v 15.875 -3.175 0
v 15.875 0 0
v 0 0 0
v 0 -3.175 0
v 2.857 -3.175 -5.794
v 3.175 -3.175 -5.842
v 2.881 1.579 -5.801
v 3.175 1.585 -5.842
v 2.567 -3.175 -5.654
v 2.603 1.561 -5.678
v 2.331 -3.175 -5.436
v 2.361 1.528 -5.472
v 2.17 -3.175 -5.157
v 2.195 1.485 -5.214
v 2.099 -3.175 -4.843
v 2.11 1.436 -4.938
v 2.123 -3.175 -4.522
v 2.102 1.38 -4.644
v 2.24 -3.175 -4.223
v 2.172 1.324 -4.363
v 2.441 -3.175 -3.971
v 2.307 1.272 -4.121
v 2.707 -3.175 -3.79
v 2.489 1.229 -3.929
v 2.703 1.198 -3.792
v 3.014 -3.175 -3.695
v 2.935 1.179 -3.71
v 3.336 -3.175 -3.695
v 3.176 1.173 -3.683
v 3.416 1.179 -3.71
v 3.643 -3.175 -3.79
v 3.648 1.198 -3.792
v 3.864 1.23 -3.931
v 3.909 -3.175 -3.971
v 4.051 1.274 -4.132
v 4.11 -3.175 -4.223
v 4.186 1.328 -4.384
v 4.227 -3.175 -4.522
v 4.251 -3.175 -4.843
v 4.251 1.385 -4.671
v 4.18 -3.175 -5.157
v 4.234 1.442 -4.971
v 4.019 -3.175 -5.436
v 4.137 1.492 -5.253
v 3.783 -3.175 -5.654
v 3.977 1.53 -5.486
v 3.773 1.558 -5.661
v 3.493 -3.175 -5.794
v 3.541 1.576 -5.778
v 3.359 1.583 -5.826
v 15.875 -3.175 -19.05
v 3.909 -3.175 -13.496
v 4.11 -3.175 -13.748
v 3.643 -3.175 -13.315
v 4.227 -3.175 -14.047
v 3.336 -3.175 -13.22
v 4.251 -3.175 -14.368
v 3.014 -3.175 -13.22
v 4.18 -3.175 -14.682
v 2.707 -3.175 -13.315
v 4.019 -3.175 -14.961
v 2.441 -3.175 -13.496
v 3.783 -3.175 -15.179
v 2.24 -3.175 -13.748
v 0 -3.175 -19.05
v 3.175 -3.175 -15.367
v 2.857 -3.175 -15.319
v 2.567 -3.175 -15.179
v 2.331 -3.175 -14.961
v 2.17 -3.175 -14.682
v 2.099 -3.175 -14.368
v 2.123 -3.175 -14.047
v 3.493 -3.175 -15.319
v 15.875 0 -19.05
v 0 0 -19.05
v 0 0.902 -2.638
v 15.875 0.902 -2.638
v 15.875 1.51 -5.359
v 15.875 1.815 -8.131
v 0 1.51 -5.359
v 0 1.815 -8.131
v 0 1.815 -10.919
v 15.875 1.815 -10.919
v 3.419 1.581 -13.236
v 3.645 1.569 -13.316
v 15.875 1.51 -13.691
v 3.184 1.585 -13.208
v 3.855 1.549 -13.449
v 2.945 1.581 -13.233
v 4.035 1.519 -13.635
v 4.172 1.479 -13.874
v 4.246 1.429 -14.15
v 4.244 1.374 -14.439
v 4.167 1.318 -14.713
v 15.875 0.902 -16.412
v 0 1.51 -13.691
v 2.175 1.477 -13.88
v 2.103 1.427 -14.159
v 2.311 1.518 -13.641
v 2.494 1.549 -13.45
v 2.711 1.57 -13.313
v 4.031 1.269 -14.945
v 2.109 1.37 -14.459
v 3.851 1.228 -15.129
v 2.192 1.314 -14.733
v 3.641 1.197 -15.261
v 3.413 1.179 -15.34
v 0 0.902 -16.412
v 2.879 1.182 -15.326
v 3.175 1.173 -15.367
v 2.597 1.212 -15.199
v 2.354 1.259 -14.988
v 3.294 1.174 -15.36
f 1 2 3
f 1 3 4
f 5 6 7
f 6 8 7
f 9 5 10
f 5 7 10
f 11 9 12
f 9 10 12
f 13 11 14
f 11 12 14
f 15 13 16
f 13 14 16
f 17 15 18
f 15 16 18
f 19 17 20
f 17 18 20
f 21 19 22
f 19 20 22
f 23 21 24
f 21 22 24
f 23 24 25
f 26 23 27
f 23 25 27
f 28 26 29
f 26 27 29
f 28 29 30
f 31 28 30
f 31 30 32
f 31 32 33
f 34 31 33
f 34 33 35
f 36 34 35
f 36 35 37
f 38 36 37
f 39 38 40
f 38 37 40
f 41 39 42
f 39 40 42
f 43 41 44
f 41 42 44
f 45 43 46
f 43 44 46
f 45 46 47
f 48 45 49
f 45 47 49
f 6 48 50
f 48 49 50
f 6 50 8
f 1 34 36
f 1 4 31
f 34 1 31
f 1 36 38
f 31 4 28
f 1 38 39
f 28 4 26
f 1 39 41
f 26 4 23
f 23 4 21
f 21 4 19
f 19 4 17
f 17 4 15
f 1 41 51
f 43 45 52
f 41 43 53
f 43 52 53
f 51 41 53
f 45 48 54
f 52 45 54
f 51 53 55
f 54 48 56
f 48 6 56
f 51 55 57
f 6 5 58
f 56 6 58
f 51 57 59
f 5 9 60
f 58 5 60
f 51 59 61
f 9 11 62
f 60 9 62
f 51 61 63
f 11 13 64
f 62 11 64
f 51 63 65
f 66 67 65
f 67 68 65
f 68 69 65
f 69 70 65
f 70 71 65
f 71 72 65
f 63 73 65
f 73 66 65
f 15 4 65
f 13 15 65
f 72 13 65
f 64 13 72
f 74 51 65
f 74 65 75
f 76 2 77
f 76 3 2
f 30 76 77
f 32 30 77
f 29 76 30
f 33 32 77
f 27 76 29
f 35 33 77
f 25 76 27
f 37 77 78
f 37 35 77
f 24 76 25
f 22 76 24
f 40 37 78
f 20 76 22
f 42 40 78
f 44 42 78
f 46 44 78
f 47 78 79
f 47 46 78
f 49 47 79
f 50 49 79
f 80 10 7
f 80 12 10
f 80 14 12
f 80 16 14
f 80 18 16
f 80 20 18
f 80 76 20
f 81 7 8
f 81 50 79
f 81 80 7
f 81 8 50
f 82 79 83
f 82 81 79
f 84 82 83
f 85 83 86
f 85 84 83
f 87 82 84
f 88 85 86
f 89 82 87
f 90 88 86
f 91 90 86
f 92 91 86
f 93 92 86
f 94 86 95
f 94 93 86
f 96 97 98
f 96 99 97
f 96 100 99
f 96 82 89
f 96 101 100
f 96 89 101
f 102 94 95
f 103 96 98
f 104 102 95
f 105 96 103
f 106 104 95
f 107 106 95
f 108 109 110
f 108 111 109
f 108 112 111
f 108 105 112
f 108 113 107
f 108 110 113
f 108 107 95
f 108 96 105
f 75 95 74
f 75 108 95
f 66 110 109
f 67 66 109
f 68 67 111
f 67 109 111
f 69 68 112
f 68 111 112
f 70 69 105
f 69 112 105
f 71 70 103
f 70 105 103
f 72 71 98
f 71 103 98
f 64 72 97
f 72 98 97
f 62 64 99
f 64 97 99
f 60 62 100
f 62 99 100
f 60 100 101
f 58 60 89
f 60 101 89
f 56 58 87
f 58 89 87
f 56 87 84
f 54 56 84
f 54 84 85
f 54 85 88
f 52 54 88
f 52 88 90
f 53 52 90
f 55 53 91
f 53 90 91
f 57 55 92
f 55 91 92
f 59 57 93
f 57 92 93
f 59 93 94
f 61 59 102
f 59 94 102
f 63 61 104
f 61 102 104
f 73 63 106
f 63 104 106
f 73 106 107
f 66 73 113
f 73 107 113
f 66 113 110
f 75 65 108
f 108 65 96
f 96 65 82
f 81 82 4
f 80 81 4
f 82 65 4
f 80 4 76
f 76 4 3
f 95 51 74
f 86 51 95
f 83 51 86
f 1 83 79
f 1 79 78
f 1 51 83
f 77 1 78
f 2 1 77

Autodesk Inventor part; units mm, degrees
ref_plane "YZ Plane" through (0, 0, 0) normal (1, 0, 0) x (0, 1, 0)
ref_plane "XZ Plane" through (0, 0, 0) normal (0, 1, 0) x (-1, 0, 0)
ref_plane "XY Plane" through (0, 0, 0) normal (0, 0, 1) x (1, 0, 0)
sketch "Sketch1" plane through (0, 0, 0) normal (1, 0, 0) x (0, 1, 0)
  line L0 (0, 0) -> (-3.175, 0)
  line L1 (-3.175, 0) -> (-3.175, -19.05)
  line L2 (-3.175, -19.05) -> (0, -19.05)
  arc A0 (0, -19.05) -> (0, 0) centre (-23.5464, -9.525) ccw
  dimension "d4" = 3.175
  dimension "d6" = 25.4
  dimension "d7" = 19.05
  dimension "d23" = 3.175
extrude "Extrusion1" add sketch "Sketch1" along normal blind 15.875
sketch "Sketch2" plane through (0, -3.175, -19.05) normal (0, -1, 0) x (1, 0, 0)
  line L0 (0, 19.05) -> (0, 0) projected
  line L1 (0, 0) -> (15.875, 0) projected
  line L2 (15.875, 19.05) -> (15.875, 0) projected
  line L3 (0, 19.05) -> (15.875, 19.05) projected
  point P0 (3.175, 14.2875)
  point P1 (3.175, 4.7625)
  dimension "d10" = 15.875
  dimension "d13" = 9.525
  dimension "d14" = 19.05
  dimension "d15" = 4.7625
  dimension "d24" = 3.175
  dimension "d25" = 3.175
hole "Hole1" at (3.175, -3.175, -4.7625) at (3.175, -3.175, -14.2875) direction (0, 1, 0) diameter 2.159 depth 6.35 tip angle 118
equation "\"d23\" = d4"
equation "\"d15\" = -0.5 * d13 + 0.5 * d14"
equation "\"d25\" = d24"
properties part number "TensionerPusher3" material "ABS Plastic"
